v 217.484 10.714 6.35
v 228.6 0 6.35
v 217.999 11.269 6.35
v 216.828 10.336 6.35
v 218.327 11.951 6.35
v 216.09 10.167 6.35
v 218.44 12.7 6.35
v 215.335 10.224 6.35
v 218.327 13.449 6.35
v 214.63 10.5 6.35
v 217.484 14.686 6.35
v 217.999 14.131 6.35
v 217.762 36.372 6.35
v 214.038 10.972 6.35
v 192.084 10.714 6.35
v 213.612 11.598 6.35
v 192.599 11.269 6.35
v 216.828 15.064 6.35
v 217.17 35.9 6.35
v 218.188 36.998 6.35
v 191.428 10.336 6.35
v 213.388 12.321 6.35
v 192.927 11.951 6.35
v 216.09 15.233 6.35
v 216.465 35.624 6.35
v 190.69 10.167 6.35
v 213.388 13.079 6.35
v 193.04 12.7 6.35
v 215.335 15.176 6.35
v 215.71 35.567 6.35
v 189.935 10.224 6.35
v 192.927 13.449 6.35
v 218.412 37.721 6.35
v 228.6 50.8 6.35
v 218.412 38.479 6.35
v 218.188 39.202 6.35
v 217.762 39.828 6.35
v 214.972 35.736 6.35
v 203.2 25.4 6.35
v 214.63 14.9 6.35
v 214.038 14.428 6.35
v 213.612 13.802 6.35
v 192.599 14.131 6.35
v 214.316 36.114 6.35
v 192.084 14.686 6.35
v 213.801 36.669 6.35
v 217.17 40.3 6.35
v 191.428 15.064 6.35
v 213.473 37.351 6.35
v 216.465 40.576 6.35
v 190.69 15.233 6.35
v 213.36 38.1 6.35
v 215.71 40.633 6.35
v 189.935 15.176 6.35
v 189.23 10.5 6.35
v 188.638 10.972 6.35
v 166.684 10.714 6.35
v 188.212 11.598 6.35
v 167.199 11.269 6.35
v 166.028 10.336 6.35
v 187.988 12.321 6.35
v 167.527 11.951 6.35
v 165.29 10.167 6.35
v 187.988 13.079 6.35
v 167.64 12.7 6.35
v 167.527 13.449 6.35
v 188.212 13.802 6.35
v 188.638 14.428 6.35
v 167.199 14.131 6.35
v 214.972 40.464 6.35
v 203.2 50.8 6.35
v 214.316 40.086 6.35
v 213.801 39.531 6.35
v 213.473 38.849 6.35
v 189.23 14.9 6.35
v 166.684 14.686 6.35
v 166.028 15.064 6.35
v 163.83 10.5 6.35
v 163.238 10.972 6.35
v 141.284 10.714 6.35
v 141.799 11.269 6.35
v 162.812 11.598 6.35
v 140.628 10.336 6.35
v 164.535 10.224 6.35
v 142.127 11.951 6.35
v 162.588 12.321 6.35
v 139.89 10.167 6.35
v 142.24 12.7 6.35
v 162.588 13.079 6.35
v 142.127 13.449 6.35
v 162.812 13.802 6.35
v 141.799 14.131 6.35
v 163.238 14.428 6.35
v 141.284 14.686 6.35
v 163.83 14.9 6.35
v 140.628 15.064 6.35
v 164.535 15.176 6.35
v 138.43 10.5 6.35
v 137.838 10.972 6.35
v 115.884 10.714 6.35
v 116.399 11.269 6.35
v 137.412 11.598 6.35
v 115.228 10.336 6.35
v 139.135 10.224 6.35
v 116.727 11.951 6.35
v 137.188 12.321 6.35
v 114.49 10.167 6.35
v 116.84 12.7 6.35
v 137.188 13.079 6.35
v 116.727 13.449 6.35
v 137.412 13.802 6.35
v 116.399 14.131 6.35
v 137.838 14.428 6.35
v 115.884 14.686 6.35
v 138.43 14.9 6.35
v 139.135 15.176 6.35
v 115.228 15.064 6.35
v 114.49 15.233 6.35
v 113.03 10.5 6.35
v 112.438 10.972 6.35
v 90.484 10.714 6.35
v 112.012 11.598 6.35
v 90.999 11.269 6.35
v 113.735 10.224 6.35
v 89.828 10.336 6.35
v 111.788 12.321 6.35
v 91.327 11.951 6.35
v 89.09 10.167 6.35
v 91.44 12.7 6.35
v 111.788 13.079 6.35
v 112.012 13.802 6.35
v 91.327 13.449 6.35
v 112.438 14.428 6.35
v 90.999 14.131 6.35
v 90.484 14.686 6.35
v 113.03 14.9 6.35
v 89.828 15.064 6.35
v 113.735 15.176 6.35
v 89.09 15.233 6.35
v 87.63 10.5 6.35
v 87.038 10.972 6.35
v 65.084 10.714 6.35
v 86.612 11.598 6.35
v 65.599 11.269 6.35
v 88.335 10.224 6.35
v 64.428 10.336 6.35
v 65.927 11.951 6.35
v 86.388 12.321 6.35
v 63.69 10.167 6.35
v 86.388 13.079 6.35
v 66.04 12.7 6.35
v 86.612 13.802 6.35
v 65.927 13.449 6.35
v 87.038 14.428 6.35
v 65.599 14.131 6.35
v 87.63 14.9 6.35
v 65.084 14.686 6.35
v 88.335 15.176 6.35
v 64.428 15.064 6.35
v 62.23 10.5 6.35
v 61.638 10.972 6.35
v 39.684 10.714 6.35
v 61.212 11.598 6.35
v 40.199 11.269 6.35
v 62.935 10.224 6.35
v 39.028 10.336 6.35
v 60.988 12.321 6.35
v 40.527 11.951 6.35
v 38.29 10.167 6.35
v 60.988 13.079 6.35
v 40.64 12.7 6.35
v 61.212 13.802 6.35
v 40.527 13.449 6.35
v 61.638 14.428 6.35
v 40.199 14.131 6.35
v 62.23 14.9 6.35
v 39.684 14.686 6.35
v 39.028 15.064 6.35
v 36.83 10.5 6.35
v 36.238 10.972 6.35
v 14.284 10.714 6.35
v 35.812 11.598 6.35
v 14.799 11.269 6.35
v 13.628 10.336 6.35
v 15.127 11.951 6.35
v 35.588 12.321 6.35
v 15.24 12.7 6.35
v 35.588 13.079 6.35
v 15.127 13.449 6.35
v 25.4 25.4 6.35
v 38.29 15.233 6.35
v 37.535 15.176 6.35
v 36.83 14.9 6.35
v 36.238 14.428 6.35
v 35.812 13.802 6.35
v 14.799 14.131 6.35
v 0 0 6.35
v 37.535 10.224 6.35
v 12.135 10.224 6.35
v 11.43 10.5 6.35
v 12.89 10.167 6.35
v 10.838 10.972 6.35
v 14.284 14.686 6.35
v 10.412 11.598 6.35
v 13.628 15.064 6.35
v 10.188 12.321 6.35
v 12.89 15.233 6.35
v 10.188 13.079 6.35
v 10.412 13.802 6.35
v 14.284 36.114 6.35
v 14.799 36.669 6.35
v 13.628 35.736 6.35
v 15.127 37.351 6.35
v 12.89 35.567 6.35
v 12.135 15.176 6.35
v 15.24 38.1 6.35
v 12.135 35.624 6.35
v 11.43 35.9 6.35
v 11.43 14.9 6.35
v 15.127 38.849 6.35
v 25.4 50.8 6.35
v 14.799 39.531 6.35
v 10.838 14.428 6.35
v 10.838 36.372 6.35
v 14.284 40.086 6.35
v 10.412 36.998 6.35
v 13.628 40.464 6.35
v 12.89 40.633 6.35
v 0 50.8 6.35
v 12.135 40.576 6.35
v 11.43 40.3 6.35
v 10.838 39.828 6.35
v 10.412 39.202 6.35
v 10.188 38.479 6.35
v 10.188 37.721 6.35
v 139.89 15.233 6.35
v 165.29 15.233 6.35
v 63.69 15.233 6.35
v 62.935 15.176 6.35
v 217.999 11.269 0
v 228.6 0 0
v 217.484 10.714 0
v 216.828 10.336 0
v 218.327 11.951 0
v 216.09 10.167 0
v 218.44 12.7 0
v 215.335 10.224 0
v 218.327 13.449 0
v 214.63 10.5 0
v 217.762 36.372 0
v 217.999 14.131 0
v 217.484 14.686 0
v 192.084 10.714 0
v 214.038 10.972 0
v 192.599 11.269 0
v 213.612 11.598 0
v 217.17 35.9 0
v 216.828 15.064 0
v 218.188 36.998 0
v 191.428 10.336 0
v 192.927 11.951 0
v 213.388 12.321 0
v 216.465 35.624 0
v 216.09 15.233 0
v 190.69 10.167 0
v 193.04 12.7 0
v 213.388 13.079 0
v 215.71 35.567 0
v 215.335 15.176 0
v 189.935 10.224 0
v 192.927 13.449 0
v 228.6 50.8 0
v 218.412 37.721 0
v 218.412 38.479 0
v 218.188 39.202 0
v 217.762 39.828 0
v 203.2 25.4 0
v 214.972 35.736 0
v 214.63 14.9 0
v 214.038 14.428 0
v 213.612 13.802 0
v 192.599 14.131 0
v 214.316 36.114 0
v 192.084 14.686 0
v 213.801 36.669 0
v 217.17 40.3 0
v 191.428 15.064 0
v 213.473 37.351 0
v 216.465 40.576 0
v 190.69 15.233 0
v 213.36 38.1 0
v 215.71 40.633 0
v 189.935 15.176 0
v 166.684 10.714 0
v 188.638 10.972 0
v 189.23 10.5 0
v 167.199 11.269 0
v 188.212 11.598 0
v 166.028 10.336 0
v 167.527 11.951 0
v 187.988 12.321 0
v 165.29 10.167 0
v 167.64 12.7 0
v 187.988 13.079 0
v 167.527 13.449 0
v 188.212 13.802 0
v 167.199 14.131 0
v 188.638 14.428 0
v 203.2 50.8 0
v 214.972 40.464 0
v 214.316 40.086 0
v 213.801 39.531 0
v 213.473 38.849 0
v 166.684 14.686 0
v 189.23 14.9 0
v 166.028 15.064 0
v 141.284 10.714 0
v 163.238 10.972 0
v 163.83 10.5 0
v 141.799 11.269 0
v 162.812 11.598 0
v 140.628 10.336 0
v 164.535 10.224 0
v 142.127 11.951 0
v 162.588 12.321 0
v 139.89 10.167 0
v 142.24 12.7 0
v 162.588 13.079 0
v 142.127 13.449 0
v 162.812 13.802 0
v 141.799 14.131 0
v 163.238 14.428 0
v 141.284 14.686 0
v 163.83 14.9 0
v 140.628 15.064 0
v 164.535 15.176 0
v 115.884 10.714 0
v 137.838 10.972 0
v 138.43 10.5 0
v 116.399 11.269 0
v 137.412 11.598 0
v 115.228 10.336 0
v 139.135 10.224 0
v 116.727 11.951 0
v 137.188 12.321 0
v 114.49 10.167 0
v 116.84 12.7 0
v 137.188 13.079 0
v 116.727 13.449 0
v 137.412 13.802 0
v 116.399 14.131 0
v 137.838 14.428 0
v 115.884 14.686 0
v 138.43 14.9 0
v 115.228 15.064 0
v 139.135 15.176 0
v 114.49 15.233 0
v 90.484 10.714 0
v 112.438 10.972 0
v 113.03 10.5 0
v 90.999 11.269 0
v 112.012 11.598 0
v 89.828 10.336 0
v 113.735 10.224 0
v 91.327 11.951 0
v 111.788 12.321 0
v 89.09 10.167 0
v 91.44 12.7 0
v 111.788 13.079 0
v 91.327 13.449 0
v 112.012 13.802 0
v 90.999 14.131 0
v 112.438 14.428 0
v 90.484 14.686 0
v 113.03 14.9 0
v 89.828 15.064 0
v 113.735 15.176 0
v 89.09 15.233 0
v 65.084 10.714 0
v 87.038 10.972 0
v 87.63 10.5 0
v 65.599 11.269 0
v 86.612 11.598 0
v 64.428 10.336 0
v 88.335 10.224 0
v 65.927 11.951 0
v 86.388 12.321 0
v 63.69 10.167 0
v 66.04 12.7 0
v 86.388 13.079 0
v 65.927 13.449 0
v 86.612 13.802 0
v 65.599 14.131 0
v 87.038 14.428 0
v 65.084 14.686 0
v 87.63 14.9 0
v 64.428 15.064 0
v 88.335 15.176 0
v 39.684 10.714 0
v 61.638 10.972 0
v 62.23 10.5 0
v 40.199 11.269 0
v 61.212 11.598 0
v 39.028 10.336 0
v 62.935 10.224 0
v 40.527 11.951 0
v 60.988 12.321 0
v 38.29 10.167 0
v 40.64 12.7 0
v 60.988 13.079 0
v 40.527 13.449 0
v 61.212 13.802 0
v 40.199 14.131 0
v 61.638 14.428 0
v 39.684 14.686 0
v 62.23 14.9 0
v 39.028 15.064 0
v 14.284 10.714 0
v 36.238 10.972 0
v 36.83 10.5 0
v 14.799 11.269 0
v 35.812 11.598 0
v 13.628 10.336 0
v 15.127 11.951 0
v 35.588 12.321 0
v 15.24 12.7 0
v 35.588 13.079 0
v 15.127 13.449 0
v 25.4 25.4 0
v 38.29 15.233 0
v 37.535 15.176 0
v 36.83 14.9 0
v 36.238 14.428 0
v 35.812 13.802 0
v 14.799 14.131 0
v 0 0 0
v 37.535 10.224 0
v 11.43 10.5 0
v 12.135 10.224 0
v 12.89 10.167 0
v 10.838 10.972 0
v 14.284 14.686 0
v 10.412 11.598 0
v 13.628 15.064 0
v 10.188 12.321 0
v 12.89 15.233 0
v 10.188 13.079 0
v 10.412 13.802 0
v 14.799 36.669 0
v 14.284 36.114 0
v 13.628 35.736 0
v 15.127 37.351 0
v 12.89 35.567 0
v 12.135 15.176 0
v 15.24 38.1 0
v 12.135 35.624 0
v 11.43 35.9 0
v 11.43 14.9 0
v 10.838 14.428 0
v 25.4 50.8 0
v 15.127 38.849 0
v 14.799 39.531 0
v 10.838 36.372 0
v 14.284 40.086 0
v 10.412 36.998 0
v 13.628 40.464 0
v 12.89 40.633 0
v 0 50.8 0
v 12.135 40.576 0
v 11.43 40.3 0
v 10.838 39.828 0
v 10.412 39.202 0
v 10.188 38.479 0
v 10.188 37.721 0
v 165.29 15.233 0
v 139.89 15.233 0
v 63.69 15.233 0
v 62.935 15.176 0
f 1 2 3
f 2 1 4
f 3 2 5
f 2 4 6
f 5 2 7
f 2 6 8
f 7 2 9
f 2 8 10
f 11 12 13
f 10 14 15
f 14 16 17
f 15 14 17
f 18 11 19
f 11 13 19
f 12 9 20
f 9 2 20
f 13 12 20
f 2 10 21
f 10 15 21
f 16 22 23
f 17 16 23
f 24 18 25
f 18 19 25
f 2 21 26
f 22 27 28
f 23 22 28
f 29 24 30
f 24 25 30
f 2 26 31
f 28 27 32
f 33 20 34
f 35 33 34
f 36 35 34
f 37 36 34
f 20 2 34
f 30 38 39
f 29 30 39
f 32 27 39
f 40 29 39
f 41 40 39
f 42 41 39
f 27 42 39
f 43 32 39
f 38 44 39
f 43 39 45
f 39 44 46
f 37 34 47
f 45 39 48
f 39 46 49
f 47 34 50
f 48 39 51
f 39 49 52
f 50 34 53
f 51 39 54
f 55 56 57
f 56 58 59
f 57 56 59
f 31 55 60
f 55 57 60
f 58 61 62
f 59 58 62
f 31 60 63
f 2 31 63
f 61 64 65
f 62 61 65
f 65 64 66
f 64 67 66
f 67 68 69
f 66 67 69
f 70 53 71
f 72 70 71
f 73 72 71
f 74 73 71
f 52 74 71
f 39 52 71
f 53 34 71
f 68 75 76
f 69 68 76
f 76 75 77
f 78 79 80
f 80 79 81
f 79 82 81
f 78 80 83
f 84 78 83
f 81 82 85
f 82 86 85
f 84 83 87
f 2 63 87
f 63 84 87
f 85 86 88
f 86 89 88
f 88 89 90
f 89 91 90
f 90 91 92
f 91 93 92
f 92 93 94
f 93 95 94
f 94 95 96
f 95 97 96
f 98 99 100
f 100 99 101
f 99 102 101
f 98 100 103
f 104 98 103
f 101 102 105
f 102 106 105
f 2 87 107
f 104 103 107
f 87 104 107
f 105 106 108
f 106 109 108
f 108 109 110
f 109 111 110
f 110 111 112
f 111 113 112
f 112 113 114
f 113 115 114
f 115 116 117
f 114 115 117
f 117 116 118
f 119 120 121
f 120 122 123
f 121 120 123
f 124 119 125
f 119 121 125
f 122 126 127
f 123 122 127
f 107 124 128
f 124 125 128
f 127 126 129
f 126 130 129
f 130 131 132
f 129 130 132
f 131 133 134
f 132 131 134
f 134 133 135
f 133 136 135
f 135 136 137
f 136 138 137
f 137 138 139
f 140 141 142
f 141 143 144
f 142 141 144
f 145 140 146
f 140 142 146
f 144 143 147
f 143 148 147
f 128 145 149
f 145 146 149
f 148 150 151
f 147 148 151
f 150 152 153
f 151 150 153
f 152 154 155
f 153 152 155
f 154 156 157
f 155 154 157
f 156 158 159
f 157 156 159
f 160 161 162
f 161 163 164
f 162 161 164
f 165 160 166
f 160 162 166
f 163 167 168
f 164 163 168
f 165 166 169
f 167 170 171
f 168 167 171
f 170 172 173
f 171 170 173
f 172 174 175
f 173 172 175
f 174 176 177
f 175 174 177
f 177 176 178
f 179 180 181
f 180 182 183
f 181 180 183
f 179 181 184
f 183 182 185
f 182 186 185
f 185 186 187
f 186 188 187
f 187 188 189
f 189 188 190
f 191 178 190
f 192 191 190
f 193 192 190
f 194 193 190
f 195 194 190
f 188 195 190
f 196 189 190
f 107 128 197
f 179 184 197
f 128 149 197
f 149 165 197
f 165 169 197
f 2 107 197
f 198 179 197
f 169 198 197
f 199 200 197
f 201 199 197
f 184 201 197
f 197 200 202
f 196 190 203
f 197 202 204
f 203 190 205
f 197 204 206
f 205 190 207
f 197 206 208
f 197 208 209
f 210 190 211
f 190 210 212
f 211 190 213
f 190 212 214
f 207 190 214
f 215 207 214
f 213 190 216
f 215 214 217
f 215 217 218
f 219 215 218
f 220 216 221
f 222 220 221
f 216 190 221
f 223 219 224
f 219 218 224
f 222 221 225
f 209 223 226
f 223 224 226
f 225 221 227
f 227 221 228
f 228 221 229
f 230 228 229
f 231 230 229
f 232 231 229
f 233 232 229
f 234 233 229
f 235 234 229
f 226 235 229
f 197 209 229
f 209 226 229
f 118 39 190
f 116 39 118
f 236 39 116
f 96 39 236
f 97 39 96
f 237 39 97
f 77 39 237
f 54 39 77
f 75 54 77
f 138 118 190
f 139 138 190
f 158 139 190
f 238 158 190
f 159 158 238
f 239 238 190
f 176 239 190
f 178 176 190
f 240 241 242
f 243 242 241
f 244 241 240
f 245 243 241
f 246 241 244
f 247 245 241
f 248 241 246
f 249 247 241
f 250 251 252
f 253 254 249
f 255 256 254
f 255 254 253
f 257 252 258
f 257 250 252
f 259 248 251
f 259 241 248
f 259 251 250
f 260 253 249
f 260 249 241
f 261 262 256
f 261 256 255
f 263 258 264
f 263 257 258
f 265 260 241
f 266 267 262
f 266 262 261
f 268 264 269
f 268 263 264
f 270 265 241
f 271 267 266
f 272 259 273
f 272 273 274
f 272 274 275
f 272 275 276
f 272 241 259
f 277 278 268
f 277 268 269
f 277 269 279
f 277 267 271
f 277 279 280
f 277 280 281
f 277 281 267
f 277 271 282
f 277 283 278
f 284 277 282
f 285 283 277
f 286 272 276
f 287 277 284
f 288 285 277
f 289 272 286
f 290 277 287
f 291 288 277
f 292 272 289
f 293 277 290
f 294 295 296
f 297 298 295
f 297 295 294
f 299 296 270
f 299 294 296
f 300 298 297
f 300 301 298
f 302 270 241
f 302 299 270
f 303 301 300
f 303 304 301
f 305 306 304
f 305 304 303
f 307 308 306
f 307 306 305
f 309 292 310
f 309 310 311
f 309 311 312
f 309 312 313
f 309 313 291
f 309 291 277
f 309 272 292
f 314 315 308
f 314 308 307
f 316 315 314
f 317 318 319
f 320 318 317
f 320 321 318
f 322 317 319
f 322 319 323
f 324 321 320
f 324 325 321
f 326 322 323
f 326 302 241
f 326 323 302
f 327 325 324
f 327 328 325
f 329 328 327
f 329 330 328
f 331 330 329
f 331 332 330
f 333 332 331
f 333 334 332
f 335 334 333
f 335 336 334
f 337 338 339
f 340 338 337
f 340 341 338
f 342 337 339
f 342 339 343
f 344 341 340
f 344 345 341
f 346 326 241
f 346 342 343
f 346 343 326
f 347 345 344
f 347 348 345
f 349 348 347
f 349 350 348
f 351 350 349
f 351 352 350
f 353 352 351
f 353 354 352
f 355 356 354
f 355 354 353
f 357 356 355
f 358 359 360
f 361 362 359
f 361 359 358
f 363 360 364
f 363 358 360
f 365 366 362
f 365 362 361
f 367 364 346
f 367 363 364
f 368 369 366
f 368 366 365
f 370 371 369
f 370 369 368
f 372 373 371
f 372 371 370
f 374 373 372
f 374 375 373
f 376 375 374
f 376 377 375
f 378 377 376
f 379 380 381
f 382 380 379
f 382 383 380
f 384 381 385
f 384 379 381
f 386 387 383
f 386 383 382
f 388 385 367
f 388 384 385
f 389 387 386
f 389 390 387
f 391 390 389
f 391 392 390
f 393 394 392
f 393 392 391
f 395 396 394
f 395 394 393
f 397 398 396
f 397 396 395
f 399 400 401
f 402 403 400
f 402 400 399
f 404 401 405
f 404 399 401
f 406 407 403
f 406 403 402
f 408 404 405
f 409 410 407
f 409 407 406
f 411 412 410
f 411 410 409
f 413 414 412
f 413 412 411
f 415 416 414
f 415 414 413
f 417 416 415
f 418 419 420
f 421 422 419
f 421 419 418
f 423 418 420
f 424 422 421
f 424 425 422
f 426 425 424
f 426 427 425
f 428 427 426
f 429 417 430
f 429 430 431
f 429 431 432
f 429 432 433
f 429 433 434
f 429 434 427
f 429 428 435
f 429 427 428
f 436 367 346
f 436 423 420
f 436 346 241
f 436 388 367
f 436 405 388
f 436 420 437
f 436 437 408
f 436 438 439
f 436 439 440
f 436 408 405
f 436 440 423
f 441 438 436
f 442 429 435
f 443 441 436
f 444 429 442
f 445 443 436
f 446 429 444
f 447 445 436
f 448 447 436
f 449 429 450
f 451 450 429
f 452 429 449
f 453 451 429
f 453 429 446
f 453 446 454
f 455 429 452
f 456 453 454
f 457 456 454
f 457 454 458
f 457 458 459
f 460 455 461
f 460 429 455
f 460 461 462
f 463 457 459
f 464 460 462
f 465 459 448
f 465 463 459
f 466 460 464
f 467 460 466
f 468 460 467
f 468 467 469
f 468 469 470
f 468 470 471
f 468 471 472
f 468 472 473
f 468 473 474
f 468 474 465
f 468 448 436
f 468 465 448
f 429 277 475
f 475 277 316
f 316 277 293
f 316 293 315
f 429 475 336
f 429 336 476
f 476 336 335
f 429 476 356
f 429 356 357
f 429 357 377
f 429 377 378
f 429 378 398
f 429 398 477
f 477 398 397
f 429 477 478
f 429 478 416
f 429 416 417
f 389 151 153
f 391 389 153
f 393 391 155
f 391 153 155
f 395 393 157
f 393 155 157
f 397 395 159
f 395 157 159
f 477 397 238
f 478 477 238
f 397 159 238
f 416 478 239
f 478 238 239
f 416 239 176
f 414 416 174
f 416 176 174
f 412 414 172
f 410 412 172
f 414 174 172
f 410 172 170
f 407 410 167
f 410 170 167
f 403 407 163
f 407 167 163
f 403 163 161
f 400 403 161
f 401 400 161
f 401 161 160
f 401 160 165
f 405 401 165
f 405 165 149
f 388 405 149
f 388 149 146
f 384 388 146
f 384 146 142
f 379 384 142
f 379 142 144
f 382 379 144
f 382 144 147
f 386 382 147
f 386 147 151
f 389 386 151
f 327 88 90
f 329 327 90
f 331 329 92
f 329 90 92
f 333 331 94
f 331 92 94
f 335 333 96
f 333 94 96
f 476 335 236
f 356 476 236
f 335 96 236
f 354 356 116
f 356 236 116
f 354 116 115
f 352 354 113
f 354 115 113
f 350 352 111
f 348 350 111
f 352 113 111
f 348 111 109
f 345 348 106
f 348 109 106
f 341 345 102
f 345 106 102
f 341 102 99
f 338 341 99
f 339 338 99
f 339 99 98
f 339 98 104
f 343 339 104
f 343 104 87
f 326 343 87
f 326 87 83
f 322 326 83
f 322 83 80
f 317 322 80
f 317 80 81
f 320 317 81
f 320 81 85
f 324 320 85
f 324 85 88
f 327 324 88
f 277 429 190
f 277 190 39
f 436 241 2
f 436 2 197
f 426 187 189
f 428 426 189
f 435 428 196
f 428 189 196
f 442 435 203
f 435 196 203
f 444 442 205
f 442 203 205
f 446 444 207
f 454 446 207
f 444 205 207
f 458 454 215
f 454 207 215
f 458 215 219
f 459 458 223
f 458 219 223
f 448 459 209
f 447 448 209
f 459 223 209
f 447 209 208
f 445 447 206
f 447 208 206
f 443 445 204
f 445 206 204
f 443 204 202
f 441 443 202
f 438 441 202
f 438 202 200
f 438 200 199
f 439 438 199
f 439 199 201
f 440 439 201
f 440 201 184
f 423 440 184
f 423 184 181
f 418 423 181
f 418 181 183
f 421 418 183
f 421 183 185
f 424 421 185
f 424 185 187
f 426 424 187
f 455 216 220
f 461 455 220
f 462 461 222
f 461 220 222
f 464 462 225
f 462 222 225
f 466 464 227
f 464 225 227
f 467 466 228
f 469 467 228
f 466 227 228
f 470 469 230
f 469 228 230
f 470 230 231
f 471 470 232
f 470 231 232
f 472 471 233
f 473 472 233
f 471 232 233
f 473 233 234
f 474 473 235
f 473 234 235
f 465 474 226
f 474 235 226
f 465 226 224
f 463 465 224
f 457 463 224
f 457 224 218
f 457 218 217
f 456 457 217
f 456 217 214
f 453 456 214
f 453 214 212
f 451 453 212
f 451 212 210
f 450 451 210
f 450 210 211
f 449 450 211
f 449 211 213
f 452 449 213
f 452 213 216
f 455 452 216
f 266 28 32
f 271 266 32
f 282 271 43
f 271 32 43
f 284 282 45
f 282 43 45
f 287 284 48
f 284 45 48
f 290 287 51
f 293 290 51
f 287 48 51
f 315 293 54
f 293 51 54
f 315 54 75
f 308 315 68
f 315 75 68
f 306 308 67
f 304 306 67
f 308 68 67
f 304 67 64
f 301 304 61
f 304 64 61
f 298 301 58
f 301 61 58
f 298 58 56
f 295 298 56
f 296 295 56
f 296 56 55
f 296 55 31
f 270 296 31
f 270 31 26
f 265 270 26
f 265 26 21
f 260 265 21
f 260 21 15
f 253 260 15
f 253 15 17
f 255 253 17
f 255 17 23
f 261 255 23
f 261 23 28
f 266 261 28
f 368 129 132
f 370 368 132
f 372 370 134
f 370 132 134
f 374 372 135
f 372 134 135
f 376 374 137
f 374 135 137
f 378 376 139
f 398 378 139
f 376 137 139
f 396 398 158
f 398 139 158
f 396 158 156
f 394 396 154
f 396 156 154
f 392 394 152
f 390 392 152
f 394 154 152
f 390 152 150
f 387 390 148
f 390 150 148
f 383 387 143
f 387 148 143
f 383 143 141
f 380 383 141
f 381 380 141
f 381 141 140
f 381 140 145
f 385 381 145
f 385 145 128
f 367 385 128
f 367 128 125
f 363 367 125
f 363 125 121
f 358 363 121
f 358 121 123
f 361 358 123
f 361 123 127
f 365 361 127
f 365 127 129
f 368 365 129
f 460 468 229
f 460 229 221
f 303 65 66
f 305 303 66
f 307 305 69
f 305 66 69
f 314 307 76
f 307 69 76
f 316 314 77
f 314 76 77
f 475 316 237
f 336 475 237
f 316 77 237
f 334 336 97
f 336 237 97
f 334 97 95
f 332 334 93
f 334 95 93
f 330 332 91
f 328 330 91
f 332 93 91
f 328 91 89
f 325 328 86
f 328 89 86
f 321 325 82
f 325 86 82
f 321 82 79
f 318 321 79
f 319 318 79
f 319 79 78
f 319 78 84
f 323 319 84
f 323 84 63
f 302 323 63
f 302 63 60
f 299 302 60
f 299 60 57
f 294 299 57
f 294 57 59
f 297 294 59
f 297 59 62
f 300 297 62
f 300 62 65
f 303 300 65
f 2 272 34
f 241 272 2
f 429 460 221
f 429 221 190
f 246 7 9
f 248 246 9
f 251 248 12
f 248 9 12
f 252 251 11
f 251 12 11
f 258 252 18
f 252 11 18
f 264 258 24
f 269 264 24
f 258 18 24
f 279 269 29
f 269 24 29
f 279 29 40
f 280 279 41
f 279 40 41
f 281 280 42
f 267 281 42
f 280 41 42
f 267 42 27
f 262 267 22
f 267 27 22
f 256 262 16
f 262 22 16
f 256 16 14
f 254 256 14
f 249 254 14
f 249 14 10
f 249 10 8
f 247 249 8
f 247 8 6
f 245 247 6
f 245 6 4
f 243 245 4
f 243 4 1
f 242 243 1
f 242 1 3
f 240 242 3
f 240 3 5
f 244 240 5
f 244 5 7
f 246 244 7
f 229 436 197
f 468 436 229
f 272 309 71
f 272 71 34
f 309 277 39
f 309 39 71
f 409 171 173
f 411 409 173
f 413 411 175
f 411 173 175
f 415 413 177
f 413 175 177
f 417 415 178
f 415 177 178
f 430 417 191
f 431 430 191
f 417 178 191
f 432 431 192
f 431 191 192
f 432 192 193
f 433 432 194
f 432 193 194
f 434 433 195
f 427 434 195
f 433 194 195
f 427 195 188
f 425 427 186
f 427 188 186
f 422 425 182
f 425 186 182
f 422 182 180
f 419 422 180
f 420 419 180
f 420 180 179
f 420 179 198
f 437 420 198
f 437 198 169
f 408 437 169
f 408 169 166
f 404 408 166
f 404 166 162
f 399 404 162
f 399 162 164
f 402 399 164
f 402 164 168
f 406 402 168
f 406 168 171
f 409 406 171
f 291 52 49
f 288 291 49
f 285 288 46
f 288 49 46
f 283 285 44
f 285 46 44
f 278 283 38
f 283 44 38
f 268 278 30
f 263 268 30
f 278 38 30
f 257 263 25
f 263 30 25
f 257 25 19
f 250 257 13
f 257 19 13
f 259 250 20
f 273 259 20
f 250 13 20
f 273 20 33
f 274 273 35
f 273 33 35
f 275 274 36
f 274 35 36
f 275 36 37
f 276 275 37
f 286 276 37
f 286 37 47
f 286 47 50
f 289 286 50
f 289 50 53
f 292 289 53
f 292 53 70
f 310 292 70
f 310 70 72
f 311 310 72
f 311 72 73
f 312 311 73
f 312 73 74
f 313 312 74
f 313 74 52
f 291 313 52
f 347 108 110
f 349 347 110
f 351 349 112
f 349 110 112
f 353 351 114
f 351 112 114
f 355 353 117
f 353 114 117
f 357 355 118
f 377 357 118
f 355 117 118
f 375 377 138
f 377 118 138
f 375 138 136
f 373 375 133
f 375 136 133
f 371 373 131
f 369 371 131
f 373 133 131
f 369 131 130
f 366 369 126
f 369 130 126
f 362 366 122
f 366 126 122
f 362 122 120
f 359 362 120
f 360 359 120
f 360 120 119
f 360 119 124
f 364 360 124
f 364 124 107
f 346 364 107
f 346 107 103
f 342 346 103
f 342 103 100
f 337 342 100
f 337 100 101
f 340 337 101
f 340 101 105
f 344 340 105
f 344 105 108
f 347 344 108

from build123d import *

# Parameters (mm, degrees)
BOSS_EXTRUDE1_DEPTH = 6.35
SKETCH2_R           = 2.54
CUT_EXTRUDE1_DEPTH  = 235.26250767


with BuildPart() as part:
    # Sketch1 → Boss-Extrude1 (new body)
    with BuildSketch(Plane.XY):
        Polygon((0, 0), (0, 50.8), (25.4, 50.8), (25.4, 25.4), (203.2, 25.4), (203.2, 50.8), (228.6, 50.8), (228.6, 0), align=None)
    extrude(amount=BOSS_EXTRUDE1_DEPTH)

    # Sketch2 → Cut-Extrude1 (cut, through all)
    with BuildSketch(Plane.XY.offset(6.35)):
        with Locations((12.7, 38.1)):
            Circle(SKETCH2_R)
        with Locations((12.7, 12.7)):
            Circle(SKETCH2_R)
        with Locations((38.1, 12.7)):
            Circle(SKETCH2_R)
        with Locations((63.5, 12.7)):
            Circle(SKETCH2_R)
        with Locations((88.9, 12.7)):
            Circle(SKETCH2_R)
        with Locations((114.3, 12.7)):
            Circle(SKETCH2_R)
        with Locations((139.7, 12.7)):
            Circle(SKETCH2_R)
        with Locations((165.1, 12.7)):
            Circle(SKETCH2_R)
        with Locations((190.5, 12.7)):
            Circle(SKETCH2_R)
        with Locations((215.9, 12.7)):
            Circle(SKETCH2_R)
        with Locations(Location((215.9, 38.1, 0), (0, 0, 180))):
            Circle(SKETCH2_R)
    extrude(amount=-CUT_EXTRUDE1_DEPTH, mode=Mode.SUBTRACT)


solid = part.part
